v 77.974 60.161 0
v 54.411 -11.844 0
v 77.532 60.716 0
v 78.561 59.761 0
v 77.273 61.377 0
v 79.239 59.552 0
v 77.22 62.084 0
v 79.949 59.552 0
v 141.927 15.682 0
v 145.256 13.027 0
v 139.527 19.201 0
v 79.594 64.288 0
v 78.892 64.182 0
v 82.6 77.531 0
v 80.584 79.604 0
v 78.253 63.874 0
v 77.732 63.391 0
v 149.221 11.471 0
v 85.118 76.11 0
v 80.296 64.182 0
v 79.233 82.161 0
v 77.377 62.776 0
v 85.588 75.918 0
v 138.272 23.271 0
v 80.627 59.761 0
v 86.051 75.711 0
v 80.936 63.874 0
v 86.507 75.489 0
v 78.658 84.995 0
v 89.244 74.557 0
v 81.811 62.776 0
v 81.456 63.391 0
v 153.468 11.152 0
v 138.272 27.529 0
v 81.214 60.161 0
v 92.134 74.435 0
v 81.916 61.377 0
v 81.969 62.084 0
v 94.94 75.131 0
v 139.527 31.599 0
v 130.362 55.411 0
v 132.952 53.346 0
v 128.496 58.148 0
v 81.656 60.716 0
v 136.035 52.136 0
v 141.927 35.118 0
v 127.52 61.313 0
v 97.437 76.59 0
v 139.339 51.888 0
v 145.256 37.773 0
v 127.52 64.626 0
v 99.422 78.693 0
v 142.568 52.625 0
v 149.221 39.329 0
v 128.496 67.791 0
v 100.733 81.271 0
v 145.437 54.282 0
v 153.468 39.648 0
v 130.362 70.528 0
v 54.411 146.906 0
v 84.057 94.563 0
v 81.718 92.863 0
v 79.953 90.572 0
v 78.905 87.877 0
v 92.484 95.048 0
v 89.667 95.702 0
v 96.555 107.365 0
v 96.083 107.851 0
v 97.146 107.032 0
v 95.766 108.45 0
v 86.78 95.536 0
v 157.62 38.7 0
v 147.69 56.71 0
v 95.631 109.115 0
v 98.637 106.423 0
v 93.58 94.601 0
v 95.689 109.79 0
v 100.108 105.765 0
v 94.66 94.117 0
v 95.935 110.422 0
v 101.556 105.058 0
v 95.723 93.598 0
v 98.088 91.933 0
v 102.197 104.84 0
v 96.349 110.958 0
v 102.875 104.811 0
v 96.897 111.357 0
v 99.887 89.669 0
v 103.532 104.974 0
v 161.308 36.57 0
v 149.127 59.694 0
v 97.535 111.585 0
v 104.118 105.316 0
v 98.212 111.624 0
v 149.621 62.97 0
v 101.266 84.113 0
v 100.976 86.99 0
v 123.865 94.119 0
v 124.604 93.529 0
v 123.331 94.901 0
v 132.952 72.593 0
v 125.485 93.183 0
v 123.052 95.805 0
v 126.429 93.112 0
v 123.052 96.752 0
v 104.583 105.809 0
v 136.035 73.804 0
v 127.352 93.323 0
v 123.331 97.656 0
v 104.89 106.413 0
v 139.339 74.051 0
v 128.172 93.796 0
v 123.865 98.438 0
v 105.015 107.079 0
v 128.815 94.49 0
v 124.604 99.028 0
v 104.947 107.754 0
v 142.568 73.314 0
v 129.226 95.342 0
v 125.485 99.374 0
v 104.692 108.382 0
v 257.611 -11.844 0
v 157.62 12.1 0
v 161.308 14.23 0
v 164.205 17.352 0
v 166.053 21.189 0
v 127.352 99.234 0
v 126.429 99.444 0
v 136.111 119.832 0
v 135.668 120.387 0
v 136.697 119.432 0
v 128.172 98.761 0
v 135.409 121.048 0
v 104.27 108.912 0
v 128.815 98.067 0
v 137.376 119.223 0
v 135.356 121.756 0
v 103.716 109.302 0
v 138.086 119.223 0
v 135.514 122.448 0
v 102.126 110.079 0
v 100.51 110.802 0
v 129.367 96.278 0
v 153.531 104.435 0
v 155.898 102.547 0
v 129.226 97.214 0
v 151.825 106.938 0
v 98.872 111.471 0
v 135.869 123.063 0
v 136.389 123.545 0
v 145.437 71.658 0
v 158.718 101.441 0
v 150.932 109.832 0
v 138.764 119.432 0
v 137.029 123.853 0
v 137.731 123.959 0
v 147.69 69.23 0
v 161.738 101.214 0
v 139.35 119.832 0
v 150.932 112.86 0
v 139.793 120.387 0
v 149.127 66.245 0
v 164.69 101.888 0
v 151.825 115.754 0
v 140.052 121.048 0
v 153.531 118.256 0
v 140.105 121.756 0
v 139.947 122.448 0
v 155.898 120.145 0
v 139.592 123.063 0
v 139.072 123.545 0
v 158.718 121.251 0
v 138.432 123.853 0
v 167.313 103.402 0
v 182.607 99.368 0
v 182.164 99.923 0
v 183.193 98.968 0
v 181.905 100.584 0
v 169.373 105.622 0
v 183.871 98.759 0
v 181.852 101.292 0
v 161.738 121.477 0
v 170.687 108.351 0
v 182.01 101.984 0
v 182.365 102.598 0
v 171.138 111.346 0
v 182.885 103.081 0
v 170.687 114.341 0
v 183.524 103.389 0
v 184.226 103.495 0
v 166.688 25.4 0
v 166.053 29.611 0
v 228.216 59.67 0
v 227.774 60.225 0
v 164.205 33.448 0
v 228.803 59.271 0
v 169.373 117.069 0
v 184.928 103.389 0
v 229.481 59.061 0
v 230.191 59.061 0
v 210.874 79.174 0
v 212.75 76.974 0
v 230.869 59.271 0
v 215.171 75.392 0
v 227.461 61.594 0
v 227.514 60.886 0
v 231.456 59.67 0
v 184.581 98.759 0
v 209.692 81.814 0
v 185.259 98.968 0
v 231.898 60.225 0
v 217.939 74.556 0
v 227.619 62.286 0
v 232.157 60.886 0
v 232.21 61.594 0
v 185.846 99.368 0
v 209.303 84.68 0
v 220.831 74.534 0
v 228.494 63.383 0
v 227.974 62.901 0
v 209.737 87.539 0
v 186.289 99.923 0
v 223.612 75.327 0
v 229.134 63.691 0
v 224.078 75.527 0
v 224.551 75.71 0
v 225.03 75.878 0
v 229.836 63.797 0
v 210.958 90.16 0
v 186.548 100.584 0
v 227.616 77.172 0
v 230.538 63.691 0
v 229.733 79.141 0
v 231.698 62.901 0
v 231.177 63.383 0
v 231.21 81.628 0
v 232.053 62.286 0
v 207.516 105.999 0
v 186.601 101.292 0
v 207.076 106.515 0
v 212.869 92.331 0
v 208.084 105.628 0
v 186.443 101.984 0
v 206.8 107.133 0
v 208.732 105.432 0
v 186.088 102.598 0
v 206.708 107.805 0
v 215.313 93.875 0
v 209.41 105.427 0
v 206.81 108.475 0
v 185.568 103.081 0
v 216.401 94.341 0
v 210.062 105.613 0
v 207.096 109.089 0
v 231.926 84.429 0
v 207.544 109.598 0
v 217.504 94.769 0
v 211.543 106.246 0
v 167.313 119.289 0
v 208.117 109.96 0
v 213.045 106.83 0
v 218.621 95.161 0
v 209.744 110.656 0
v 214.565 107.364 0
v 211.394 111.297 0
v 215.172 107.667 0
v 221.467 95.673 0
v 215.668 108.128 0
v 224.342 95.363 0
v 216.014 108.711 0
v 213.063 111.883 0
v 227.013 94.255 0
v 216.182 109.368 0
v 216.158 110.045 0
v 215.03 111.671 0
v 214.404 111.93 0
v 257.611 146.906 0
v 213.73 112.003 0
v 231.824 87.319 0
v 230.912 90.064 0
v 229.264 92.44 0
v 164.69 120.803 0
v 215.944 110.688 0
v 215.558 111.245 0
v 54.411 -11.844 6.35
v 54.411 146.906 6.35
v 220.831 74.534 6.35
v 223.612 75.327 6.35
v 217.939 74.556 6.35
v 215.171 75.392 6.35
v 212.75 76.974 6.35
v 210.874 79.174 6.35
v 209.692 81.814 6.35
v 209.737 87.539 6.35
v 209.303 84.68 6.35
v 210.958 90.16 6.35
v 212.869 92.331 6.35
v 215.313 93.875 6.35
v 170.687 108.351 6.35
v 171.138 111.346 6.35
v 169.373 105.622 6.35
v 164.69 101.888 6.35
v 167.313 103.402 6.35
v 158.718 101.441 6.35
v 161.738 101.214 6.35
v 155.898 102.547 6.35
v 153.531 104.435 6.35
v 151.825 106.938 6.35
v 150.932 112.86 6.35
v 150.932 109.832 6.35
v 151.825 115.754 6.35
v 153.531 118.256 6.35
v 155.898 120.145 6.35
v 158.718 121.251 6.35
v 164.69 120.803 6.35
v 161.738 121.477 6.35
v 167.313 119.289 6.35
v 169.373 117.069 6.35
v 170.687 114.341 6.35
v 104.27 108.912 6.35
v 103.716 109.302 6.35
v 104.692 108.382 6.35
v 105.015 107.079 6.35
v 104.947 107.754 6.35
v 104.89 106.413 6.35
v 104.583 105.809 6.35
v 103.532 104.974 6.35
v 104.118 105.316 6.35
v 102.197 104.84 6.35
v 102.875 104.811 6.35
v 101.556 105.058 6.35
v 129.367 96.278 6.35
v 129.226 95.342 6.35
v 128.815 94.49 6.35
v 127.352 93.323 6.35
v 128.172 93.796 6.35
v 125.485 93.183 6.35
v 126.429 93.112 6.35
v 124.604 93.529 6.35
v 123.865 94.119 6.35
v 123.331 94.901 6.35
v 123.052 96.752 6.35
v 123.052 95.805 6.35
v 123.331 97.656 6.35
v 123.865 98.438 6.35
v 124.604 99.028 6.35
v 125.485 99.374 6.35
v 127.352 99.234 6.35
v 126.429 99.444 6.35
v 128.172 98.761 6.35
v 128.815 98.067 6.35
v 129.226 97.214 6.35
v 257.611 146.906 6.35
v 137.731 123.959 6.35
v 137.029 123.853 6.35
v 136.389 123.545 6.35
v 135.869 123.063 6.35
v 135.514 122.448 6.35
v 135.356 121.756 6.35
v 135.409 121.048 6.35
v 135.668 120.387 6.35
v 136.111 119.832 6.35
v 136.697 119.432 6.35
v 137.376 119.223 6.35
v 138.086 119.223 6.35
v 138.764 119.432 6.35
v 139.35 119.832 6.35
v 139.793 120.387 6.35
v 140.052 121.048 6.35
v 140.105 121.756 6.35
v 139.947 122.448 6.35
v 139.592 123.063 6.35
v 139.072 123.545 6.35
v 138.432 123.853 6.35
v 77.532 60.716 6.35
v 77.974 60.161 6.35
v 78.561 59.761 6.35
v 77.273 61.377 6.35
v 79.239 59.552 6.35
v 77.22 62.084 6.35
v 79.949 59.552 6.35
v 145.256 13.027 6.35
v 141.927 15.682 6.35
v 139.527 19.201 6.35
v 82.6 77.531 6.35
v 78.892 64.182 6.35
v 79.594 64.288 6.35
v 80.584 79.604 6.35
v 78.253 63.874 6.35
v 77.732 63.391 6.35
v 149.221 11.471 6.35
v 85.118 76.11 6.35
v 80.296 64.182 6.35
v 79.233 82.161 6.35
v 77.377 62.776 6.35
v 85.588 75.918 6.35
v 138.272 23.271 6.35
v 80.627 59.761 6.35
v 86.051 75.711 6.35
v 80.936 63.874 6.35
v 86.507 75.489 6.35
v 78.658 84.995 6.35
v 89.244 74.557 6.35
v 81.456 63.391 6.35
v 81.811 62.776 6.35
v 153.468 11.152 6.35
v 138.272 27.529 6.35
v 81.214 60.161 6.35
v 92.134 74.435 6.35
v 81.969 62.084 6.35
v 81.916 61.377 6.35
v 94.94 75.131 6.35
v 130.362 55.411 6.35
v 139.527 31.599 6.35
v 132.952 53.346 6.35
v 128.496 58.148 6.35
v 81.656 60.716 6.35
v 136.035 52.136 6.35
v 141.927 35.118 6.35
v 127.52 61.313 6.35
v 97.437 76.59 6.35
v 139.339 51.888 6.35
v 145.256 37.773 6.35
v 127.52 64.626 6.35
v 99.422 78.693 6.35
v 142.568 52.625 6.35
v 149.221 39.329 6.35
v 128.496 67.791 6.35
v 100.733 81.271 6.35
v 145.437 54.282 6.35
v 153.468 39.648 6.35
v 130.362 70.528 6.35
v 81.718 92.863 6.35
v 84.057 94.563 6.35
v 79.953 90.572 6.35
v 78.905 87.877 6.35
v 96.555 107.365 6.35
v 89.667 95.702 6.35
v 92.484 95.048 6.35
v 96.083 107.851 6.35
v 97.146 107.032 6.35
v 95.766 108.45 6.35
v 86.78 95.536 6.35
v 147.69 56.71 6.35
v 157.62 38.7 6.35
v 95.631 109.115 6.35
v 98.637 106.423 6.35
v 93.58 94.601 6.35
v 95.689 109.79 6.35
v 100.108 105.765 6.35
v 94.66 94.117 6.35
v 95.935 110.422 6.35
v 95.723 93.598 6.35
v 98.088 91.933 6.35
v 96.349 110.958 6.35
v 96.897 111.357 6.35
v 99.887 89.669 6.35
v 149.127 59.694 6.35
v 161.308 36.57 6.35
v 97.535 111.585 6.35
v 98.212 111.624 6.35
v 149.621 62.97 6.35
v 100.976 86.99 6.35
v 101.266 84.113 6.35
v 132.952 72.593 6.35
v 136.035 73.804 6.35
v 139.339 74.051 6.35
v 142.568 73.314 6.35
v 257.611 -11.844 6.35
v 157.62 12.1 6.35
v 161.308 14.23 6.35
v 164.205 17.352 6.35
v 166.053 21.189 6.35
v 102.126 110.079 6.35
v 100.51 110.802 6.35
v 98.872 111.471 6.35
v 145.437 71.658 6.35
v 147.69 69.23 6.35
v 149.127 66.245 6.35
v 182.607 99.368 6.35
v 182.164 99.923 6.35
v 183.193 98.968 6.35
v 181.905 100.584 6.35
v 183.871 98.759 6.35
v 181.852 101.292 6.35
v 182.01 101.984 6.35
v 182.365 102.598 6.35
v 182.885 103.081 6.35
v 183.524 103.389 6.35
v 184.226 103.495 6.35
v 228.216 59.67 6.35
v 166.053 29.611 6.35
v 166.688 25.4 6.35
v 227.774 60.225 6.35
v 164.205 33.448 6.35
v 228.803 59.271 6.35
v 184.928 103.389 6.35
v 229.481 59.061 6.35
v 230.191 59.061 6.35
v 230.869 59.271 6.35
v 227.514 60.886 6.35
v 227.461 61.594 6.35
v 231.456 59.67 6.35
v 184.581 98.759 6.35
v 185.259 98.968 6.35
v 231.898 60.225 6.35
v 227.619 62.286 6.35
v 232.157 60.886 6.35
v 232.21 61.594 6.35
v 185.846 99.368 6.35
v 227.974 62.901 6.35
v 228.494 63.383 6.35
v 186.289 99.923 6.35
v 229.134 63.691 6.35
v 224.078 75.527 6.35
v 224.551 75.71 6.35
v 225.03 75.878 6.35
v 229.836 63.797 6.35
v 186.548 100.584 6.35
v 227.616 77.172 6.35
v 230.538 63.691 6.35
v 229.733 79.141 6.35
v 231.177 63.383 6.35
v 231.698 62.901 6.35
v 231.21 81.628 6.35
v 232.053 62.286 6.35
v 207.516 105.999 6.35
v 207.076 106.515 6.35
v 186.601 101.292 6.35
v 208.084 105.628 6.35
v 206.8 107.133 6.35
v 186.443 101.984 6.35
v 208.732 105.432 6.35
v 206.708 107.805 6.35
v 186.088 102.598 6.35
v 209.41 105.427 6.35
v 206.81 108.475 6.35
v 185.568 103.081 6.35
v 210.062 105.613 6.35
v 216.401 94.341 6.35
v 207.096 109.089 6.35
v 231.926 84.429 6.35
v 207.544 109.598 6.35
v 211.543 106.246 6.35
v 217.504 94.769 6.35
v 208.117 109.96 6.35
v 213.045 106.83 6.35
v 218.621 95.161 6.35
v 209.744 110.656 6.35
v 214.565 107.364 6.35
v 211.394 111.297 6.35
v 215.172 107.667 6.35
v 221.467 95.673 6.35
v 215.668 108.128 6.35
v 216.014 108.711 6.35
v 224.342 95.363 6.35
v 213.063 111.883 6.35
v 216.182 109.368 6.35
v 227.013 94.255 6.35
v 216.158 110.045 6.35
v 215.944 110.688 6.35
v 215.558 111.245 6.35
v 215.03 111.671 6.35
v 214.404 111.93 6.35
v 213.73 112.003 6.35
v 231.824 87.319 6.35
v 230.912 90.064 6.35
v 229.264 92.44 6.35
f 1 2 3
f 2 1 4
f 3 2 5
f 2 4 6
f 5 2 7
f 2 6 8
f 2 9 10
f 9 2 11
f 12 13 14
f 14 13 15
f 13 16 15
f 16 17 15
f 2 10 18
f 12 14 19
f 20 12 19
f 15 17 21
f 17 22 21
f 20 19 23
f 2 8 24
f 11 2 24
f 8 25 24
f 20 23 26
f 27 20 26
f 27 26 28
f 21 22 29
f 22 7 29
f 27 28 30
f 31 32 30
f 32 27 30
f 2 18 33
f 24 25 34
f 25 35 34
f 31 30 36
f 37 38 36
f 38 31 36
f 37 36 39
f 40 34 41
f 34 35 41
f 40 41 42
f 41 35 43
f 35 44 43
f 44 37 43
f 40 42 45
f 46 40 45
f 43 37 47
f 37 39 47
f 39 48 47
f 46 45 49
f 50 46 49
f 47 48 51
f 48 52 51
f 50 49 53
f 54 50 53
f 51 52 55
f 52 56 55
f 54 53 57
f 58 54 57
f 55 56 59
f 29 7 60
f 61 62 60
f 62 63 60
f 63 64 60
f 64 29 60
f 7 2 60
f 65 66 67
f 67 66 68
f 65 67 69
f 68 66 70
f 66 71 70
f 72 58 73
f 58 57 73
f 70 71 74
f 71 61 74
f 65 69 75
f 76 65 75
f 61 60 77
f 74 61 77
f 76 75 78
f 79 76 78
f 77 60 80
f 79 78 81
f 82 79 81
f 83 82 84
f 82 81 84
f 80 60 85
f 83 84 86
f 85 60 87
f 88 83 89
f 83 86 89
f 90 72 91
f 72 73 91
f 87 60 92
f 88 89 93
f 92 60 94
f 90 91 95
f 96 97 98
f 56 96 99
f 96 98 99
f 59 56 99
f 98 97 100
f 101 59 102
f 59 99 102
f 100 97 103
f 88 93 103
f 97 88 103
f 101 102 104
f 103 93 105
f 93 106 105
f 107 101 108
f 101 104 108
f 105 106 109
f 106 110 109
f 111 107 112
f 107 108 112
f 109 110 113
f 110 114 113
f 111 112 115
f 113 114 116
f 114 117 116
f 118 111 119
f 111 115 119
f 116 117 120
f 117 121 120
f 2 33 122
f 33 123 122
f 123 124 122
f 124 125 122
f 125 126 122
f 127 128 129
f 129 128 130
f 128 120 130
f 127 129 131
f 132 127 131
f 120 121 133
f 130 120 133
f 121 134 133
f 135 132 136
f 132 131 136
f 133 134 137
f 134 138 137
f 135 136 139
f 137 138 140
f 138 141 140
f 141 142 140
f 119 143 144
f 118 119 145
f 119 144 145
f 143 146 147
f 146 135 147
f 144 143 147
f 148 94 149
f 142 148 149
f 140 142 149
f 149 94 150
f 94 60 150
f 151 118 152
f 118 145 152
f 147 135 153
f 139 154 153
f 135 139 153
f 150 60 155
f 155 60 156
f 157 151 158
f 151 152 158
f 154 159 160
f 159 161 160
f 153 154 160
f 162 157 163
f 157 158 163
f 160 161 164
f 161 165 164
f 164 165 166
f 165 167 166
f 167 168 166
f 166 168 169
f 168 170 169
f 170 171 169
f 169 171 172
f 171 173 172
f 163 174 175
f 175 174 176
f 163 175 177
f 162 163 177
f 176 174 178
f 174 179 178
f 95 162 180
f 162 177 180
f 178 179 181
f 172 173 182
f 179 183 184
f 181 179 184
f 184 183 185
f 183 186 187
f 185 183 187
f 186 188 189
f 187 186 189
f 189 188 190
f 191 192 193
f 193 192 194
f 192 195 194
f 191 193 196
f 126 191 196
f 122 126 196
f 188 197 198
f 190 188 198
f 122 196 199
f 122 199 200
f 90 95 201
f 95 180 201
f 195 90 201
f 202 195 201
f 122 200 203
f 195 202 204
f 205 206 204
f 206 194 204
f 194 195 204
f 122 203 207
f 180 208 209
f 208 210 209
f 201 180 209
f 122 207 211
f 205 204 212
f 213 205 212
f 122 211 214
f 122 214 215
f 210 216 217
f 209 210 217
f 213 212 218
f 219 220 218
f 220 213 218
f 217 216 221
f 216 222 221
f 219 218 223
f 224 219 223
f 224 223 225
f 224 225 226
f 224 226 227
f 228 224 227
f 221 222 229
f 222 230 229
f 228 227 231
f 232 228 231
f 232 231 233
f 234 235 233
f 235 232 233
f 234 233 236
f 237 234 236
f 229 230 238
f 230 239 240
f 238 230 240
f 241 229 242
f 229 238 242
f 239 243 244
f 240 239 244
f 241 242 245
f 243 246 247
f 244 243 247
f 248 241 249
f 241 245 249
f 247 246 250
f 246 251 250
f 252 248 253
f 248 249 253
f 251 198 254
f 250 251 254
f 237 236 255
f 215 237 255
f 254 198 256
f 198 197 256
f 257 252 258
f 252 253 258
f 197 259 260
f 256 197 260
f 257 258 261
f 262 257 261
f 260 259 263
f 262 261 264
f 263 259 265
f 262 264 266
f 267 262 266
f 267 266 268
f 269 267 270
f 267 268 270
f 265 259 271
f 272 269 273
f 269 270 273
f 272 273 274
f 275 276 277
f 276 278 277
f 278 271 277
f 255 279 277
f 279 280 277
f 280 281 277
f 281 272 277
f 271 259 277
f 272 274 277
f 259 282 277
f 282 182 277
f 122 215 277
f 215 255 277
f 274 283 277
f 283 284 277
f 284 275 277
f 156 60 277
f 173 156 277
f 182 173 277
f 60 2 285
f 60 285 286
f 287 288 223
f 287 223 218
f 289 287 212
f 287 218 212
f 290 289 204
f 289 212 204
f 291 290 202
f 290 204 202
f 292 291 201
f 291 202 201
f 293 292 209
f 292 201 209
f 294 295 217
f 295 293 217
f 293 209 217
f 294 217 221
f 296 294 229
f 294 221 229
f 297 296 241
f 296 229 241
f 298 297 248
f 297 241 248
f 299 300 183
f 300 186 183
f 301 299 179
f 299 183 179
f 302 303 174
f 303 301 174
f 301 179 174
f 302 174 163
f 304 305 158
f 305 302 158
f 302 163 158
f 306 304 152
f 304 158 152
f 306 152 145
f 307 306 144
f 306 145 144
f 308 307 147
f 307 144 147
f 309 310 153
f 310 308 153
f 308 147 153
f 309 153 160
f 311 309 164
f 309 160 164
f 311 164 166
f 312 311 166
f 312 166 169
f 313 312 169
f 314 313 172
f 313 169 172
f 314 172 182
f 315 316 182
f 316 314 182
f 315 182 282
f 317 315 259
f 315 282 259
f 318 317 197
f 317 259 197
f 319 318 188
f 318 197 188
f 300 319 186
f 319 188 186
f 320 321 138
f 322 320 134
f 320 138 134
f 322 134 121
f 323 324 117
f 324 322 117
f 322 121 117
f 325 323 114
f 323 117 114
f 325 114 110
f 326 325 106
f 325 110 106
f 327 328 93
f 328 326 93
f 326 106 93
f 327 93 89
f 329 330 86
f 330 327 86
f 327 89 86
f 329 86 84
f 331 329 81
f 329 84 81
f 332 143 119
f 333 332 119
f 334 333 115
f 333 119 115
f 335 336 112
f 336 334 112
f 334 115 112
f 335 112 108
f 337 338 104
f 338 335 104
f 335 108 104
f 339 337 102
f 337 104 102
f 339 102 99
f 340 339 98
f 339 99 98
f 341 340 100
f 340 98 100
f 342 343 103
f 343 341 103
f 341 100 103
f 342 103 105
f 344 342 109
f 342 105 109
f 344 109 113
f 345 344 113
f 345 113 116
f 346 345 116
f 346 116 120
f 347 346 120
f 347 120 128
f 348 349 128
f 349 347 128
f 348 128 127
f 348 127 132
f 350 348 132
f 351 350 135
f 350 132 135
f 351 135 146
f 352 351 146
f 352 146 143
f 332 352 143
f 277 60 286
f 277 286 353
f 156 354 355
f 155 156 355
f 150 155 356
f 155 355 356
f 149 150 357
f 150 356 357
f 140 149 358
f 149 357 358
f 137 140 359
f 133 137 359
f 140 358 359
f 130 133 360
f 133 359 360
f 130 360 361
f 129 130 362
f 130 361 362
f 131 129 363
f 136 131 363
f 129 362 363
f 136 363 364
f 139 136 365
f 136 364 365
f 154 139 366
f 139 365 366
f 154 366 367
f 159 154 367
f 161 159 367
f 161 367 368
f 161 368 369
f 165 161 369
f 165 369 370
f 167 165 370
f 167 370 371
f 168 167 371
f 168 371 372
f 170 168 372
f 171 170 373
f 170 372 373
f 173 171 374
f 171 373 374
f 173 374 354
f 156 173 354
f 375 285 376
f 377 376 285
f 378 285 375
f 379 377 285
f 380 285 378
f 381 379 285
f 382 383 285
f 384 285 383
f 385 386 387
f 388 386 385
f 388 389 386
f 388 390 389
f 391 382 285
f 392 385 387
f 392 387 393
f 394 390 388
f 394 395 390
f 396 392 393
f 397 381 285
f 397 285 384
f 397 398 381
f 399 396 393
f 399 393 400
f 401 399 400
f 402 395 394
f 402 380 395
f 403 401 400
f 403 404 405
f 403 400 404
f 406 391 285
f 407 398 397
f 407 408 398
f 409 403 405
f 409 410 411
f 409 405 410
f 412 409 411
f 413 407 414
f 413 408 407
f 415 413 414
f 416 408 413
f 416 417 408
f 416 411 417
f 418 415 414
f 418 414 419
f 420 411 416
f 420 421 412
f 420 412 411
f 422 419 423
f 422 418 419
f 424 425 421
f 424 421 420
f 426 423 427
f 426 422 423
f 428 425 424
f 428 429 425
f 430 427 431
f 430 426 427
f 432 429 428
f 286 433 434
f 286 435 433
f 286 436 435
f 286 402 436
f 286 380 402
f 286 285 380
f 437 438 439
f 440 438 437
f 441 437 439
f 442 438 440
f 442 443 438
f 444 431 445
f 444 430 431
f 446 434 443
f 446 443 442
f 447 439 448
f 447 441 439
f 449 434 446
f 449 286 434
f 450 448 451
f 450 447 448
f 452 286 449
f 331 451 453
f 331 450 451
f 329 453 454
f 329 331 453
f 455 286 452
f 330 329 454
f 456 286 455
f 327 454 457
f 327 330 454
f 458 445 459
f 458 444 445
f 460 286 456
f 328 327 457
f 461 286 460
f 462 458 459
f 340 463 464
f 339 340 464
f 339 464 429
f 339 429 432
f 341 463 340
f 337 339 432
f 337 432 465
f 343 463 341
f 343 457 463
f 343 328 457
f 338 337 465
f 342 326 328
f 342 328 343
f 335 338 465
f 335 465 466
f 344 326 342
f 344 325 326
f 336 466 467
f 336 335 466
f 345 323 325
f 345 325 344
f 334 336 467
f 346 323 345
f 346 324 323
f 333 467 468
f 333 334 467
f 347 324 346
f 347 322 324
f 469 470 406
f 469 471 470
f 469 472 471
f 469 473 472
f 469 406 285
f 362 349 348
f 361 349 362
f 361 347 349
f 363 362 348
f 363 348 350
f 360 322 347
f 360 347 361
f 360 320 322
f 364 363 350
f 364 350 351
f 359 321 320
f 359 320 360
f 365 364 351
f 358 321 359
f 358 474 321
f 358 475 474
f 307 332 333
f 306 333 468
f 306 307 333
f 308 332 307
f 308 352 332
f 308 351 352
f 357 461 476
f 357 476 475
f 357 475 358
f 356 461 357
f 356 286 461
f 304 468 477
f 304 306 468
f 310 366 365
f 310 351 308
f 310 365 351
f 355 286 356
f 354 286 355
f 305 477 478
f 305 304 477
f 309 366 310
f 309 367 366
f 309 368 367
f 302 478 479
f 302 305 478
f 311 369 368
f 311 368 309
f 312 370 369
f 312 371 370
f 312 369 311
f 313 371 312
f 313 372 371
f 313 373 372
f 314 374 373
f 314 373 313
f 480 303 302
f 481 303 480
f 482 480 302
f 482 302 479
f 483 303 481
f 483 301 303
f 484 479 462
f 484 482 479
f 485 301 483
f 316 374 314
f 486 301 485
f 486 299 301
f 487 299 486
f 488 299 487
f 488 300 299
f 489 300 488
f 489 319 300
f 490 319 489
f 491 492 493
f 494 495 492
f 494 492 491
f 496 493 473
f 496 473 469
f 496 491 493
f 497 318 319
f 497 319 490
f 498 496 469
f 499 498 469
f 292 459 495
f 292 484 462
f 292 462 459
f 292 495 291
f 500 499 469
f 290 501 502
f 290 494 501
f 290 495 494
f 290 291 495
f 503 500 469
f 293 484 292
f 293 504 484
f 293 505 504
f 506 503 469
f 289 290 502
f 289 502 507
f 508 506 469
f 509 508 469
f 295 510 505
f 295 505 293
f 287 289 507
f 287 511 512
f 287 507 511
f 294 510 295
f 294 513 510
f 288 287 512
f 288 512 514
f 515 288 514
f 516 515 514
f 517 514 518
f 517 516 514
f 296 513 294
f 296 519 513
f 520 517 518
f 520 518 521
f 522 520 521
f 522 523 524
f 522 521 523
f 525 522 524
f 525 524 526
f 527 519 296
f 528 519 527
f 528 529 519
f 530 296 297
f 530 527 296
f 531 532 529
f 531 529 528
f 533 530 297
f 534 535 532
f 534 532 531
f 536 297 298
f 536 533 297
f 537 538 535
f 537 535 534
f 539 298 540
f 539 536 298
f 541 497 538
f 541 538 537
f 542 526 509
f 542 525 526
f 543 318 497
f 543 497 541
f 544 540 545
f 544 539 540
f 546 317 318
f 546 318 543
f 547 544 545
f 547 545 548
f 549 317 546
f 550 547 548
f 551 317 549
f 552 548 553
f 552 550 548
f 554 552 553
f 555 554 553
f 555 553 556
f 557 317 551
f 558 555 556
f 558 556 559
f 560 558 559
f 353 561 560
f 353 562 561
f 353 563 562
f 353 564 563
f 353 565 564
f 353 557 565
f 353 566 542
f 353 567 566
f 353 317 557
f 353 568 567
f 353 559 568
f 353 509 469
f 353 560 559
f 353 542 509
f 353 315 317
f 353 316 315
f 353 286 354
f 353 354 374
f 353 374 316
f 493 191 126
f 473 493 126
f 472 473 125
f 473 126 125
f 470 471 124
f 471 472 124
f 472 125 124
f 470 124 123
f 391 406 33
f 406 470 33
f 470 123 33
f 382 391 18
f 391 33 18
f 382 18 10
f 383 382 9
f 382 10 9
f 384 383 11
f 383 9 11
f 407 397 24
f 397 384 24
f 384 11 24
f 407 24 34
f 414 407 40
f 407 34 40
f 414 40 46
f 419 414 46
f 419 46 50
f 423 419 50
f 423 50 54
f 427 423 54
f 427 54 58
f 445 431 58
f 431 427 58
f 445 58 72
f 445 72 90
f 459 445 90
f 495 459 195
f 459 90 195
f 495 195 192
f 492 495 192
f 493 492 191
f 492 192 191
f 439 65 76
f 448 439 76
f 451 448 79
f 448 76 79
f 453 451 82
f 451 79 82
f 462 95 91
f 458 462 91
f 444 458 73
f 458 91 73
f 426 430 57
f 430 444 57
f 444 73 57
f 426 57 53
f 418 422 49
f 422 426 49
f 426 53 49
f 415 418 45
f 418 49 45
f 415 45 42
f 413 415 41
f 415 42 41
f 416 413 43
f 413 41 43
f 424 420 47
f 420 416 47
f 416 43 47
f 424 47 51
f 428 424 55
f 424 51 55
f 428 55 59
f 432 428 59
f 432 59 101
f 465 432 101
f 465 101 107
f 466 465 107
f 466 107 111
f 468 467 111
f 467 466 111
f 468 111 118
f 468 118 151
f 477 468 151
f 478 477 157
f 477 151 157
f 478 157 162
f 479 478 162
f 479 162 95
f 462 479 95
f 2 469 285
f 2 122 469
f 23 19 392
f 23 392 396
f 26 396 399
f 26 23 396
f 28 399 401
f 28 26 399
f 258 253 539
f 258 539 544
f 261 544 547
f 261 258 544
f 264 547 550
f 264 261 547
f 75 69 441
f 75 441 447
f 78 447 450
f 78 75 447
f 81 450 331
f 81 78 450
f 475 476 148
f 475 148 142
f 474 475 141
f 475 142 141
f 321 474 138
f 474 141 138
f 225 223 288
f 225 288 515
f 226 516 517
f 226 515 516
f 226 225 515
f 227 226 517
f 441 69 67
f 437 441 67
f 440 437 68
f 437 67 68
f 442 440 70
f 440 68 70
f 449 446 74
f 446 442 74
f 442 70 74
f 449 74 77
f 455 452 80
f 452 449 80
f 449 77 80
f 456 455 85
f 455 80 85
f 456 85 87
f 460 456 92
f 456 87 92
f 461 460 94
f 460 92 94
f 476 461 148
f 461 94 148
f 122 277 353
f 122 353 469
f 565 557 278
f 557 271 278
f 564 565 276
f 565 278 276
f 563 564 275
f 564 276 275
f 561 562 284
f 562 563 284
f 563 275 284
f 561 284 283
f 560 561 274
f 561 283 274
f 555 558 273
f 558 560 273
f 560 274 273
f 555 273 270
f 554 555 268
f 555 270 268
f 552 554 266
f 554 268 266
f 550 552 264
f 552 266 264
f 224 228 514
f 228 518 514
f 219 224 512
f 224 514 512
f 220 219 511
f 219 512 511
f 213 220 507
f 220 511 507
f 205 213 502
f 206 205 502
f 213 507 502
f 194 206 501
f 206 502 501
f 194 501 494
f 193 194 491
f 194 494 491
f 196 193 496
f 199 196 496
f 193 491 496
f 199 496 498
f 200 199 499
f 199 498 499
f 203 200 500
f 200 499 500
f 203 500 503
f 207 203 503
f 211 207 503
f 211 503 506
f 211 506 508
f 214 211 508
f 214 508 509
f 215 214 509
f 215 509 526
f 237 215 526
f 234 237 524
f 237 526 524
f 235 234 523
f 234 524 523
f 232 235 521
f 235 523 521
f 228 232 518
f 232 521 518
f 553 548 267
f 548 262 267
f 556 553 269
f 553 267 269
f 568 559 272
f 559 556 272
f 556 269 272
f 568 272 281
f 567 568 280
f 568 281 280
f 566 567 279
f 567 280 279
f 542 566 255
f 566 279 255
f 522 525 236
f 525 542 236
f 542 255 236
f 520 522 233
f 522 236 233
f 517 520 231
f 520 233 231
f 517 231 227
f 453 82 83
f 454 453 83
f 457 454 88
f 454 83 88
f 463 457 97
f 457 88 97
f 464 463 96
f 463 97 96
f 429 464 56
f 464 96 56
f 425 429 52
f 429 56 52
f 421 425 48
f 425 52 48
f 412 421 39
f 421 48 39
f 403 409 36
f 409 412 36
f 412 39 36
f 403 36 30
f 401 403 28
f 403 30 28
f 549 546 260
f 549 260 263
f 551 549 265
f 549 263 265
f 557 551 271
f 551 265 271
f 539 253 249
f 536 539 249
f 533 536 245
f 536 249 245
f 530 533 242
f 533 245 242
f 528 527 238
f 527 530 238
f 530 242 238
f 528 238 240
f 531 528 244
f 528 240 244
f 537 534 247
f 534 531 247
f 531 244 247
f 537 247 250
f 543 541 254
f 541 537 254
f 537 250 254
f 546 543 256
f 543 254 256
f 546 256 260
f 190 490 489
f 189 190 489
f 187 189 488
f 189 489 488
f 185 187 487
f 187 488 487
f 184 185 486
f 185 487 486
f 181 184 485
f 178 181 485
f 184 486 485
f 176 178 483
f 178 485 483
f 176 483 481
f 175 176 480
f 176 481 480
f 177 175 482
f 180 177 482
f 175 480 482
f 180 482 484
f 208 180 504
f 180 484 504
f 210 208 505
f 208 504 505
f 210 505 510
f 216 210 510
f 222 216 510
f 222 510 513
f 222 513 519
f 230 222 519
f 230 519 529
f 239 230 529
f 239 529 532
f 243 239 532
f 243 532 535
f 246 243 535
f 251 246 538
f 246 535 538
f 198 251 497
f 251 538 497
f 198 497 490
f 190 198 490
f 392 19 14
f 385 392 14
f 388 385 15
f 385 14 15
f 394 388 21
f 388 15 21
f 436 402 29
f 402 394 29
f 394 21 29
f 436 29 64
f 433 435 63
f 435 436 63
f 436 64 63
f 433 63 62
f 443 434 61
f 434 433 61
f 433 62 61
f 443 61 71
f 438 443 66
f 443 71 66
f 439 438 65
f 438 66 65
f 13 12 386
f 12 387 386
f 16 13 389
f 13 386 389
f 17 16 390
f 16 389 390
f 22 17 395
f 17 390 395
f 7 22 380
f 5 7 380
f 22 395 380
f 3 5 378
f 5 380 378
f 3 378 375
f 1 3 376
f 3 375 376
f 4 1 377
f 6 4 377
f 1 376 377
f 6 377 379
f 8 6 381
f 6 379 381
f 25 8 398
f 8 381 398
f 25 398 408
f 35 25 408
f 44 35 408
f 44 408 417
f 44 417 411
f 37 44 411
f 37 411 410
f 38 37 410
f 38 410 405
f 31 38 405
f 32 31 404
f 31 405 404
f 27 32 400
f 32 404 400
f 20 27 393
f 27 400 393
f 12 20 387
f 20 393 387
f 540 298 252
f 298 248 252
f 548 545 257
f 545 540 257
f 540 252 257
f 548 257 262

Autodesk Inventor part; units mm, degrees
ref_plane "YZ Plane" through (0, 0, 0) normal (1, 0, 0) x (0, 1, 0)
ref_plane "XZ Plane" through (0, 0, 0) normal (0, 1, 0) x (-1, 0, 0)
ref_plane "XY Plane" through (0, 0, 0) normal (0, 0, 1) x (1, 0, 0)
sketch "Sketch1" plane through (0, 0, 0) normal (0, 0, 1) x (1, 0, 0)
  line L0 (0, 0) -> (304.8, 0) construction
  line L1 (304.8, 0) -> (304.8, 50.8) construction
  line L2 (304.8, 50.8) -> (0, 50.8) construction
  line L3 (0, 50.8) -> (0, 0) construction
  circle A0 centre (152.4, 25.4) radius 14.2875
  circle A1 centre (152.4, 25.4) radius 30.48 construction
  circle A2 centre (152.4, 25.4) radius 22.225 construction
  line L4 (152.4, 25.4) -> (138.5082, 62.9697) construction
  circle A3 centre (138.5082, 62.9697) radius 9.525 construction
  circle A4 centre (138.5082, 62.9697) radius 17.78 construction
  circle A5 centre (89.9711, 85.09) radius 31.75
  circle A6 centre (160.9785, 111.3458) radius 31.75
  circle A7 centre (220.6325, 85.09) radius 31.75
  line L5 (0, 50.8) -> (0, 53.34) construction
  line L6 (0, 53.34) -> (304.8, 53.34) construction
  line L7 (304.8, 53.34) -> (304.8, 50.8) construction
  circle A8 centre (138.5082, 62.9697) radius 21.59 construction
  circle A9 centre (152.4, 25.4) radius 46.99 construction
  circle A10 centre (152.4, 25.4) radius 50.8 construction
  arc A11 (84.9408, 79.3264) -> (90.9184, 92.6811) centre (89.9711, 85.09) ccw construction
  circle A12 centre (160.9785, 111.3458) radius 7.65 construction
  circle A13 centre (220.6325, 85.09) radius 7.65 construction
  circle A14 centre (160.9785, 111.3458) radius 9.1 construction
  line L8 (164.8287, 119.5911) -> (223.8692, 92.0215) construction
  line L9 (157.4988, 102.9373) -> (217.7073, 78.0214) construction
  circle A15 centre (138.5082, 62.9697) radius 22.9 construction
  line L10 (84.9408, 79.3264) -> (123.4503, 45.7166) construction
  line L11 (168.5483, 110.2412) -> (161.1682, 59.6633) construction
  line L12 (90.9184, 92.6811) -> (89.9711, 85.09) construction
  line L13 (89.9711, 85.09) -> (84.9408, 79.3264) construction
  circle A16 centre (126.192, 96.2783) radius 3.175
  circle A17 centre (126.192, 96.2783) radius 7.9375 construction
  line L14 (90.9184, 92.6811) -> (125.2091, 88.4019) construction
  line L15 (132.0626, 90.936) -> (155.3205, 116.4945) construction
  line L16 (155.3205, 116.4945) -> (160.9785, 111.3458) construction
  line L17 (168.5483, 110.2412) -> (160.9785, 111.3458) construction
  line L18 (138.5082, 62.9697) -> (126.192, 96.2783) construction
  line L19 (89.9711, 85.09) -> (160.9785, 111.3458) construction
  line L20 (152.4, 25.4) -> (89.9711, 85.09) construction
  line L21 (152.4, 25.4) -> (160.9785, 111.3458) construction
  circle A18 centre (126.192, 96.2783) radius 9.2075 construction
  circle A19 centre (126.192, 96.2783) radius 6.1595 construction
  arc A20 (90.9184, 92.6811) -> (84.9408, 79.3264) centre (89.9711, 85.09) ccw construction
  line L22 (160.9785, 111.3458) -> (220.6325, 85.09) construction
  circle A21 centre (160.9785, 111.3458) radius 25.4 construction
  circle A22 centre (220.6325, 85.09) radius 25.4 construction
  line L23 (102.9424, 114.0695) -> (76.9998, 56.1105) construction
  circle A23 centre (89.9711, 85.09) radius 25.4 construction
  line L24 (209.1281, 114.6824) -> (232.1368, 55.4976) construction
  circle A24 centre (160.9785, 111.3458) radius 10.16
  line L25 (54.4111, 146.9058) -> (257.6111, 146.9058)
  line L26 (257.6111, 146.9058) -> (257.6111, -11.8442)
  line L27 (257.6111, -11.8442) -> (54.4111, -11.8442)
  line L28 (54.4111, -11.8442) -> (54.4111, 146.9058)
  circle A25 centre (138.5082, 62.9697) radius 11.1125
  arc A26 (225.0295, 75.8783) -> (218.6208, 95.1612) centre (221.8252, 85.5197) ccw
  line L29 (219.4627, 84.6013) -> (229.8359, 61.416) construction
  line L30 (221.8252, 85.5197) -> (229.8359, 61.416) construction
  line L31 (219.4627, 84.6013) -> (209.0895, 107.7866) construction
  line L32 (221.8252, 85.5197) -> (213.8144, 109.6234) construction
  arc A27 (208.117, 109.9602) -> (210.062, 105.6129) centre (209.0895, 107.7866) ccw
  arc A28 (214.5654, 107.3637) -> (213.0634, 111.8831) centre (213.8144, 109.6234) ccw
  arc A29 (214.5654, 107.3637) -> (210.062, 105.6129) centre (229.8359, 61.416) ccw
  arc A30 (213.0634, 111.8831) -> (208.117, 109.9602) centre (229.8359, 61.416) ccw
  line L33 (209.0895, 107.7866) -> (208.117, 109.9602) construction
  line L34 (213.8144, 109.6234) -> (213.0634, 111.8831) construction
  arc A31 (218.6208, 95.1612) -> (215.3134, 93.8754) centre (229.8359, 61.416) ccw
  arc A32 (225.0295, 75.8783) -> (223.612, 75.3272) centre (229.8359, 61.416) ccw
  line L35 (102.6358, 107.1803) -> (91.1149, 84.5434) construction
  line L36 (79.5941, 61.9064) -> (88.8014, 85.5789) construction
  arc A33 (98.8719, 111.4706) -> (97.1455, 107.0321) centre (98.0087, 109.2513) ccw
  arc A34 (101.5557, 105.0581) -> (103.7158, 109.3025) centre (102.6358, 107.1803) ccw
  arc A35 (101.5557, 105.0581) -> (97.1455, 107.0321) centre (79.5941, 61.9064) ccw
  line L37 (98.0087, 109.2513) -> (98.8719, 111.4706) construction
  line L38 (102.6358, 107.1803) -> (103.7158, 109.3025) construction
  arc A36 (103.7158, 109.3025) -> (98.8719, 111.4706) centre (79.5941, 61.9064) ccw
  arc A37 (215.3134, 93.8754) -> (223.612, 75.3272) centre (219.4627, 84.6013) ccw
  arc A38 (86.5066, 75.4886) -> (95.7233, 93.5981) centre (91.1149, 84.5434) ccw
  line L39 (88.8014, 85.5789) -> (98.0087, 109.2513) construction
  line L40 (91.1149, 84.5434) -> (79.5941, 61.9064) construction
  arc A39 (86.5066, 75.4886) -> (85.1185, 76.1099) centre (79.5941, 61.9064) ccw
  arc A40 (95.7233, 93.5981) -> (92.4843, 95.0479) centre (79.5941, 61.9064) ccw
  arc A41 (92.4843, 95.0479) -> (85.1185, 76.1099) centre (88.8014, 85.5789) ccw
  line L41 (160.9785, 111.3458) -> (137.7306, 121.5779) construction
  point P0 (184.2263, 101.1136)
  point P1 (211.429, 108.764)
  point P2 (100.3481, 108.2736)
  dimension "d1" = 50.8
  dimension "d2" = 28.575
  dimension "d3" = 25.4
  dimension "d4" = 152.4
  dimension "d7" = 60.96
  dimension "d8" = 44.45
  dimension "d9" = 19.05
  dimension "d10" = 35.56
  dimension "d11" = 40.0558
  dimension "d12" = 63.5
  dimension "d13" = 63.5
  dimension "d14" = 63.5
  dimension "d15" = 2.54
  dimension "d16" = 304.8
  dimension "d17" = 43.18
  dimension "d18" = 93.98
  dimension "d19" = 101.6
  dimension "d21" = 15.3
  dimension "d22" = 15.3
  dimension "d23" = 15.3
  dimension "d24" = 18.2
  dimension "d29" = 45.8
  dimension "d30" = 146
  dimension "d31" = 6.35
  dimension "d32" = 15.875
  dimension "d33" = 146
  dimension "d35" = 18.415
  dimension "d37" = 12.319
  dimension "d38" = 65.1764
  dimension "d40" = 50.8
  dimension "d41" = 50.8
  dimension "d42" = 17
  dimension "d43" = 17
  dimension "d44" = 50.8
  dimension "d45" = 45
  dimension "d50" = 20.32
  dimension "d53" = 203.2
  dimension "d54" = 158.75
  dimension "d55" = 35.56
  dimension "d56" = 35.56
  dimension "d57" = 22.225
  dimension "d67" = 25.4
  dimension "d68" = 25.4
  dimension "d69" = 2.86
  dimension "d70" = 25.4
  dimension "d71" = 25.4
  dimension "d72" = 4.7625
  dimension "d75" = 2.86
  dimension "d80" = 4.7625
  dimension "d82" = 4.7625
  dimension "d83" = 50.8
  dimension "d84" = 50.8
  dimension "d85" = 10.16
  dimension "d97" = 48.4188
  dimension "d99" = 20.32
  dimension "d101" = 25.4
  dimension "d102" = 25.4
  dimension "d103" = 10.16
  dimension "d104" = 180
extrude "Extrusion2" add sketch "Sketch1" along normal blind 6.35 contours A5 | A6 | A7 | L25 L26 L27 L28
hole "Hole2" at (79.5941, 61.9064, 0) at (229.8359, 61.416, 0) at (184.2263, 101.1136, 0) at (137.7306, 121.5779, 0) direction (0, 0, 1) diameter 4.7625 end through all
equation "\"d2\" = BearingLargeOD"
equation "\"d7\" = Gear48tPD"
equation "\"d8\" = Gear35tPD"
equation "\"d9\" = Gear15tPD"
equation "\"d10\" = Gear28tPD"
equation "\"d11\" = 0.5 * Gear48tPD + 0.5 * Gear15tPD + MeshingClearance"
equation "\"d12\" = CimOD"
equation "\"d13\" = CimOD"
equation "\"d14\" = CimOD"
equation "\"d17\" = Gear28tPD + ClearanceDiameter"
equation "\"d18\" = WheelOD"
equation "\"d19\" = WheelClearance"
equation "\"Pulley48tPD\" = 45.8"
equation "\"Pulley19tPD\" = 18.2"
equation "\"Pulley16tPD\" = 15.3"
equation "\"Gear15tPD\" = 19.05"
equation "\"Gear35tPD\" = 44.45"
equation "\"Gear48tPD\" = 60.96"
equation "\"Gear28tPD\" = 35.56"
equation "\"BearingLargeOD\" = 28.575"
equation "\"BearingSmallOD\" = 22.225"
equation "\"MeshingClearance\" = 0.0508"
equation "\"CimOD\" = 63.5"
equation "\"WheelOD\" = 93.98"
equation "\"ClearanceDiameter\" = 7.62"
equation "\"WheelClearance\" = 101.6"
equation "\"TensioningBearingID\" = 6.35"
equation "\"TensioningBearingOD\" = 15.875"
equation "\"SpingClipClearance\" = 8.89"
equation "\"Pi\" = 79.79645"
properties part number "OutlineSketch1"
